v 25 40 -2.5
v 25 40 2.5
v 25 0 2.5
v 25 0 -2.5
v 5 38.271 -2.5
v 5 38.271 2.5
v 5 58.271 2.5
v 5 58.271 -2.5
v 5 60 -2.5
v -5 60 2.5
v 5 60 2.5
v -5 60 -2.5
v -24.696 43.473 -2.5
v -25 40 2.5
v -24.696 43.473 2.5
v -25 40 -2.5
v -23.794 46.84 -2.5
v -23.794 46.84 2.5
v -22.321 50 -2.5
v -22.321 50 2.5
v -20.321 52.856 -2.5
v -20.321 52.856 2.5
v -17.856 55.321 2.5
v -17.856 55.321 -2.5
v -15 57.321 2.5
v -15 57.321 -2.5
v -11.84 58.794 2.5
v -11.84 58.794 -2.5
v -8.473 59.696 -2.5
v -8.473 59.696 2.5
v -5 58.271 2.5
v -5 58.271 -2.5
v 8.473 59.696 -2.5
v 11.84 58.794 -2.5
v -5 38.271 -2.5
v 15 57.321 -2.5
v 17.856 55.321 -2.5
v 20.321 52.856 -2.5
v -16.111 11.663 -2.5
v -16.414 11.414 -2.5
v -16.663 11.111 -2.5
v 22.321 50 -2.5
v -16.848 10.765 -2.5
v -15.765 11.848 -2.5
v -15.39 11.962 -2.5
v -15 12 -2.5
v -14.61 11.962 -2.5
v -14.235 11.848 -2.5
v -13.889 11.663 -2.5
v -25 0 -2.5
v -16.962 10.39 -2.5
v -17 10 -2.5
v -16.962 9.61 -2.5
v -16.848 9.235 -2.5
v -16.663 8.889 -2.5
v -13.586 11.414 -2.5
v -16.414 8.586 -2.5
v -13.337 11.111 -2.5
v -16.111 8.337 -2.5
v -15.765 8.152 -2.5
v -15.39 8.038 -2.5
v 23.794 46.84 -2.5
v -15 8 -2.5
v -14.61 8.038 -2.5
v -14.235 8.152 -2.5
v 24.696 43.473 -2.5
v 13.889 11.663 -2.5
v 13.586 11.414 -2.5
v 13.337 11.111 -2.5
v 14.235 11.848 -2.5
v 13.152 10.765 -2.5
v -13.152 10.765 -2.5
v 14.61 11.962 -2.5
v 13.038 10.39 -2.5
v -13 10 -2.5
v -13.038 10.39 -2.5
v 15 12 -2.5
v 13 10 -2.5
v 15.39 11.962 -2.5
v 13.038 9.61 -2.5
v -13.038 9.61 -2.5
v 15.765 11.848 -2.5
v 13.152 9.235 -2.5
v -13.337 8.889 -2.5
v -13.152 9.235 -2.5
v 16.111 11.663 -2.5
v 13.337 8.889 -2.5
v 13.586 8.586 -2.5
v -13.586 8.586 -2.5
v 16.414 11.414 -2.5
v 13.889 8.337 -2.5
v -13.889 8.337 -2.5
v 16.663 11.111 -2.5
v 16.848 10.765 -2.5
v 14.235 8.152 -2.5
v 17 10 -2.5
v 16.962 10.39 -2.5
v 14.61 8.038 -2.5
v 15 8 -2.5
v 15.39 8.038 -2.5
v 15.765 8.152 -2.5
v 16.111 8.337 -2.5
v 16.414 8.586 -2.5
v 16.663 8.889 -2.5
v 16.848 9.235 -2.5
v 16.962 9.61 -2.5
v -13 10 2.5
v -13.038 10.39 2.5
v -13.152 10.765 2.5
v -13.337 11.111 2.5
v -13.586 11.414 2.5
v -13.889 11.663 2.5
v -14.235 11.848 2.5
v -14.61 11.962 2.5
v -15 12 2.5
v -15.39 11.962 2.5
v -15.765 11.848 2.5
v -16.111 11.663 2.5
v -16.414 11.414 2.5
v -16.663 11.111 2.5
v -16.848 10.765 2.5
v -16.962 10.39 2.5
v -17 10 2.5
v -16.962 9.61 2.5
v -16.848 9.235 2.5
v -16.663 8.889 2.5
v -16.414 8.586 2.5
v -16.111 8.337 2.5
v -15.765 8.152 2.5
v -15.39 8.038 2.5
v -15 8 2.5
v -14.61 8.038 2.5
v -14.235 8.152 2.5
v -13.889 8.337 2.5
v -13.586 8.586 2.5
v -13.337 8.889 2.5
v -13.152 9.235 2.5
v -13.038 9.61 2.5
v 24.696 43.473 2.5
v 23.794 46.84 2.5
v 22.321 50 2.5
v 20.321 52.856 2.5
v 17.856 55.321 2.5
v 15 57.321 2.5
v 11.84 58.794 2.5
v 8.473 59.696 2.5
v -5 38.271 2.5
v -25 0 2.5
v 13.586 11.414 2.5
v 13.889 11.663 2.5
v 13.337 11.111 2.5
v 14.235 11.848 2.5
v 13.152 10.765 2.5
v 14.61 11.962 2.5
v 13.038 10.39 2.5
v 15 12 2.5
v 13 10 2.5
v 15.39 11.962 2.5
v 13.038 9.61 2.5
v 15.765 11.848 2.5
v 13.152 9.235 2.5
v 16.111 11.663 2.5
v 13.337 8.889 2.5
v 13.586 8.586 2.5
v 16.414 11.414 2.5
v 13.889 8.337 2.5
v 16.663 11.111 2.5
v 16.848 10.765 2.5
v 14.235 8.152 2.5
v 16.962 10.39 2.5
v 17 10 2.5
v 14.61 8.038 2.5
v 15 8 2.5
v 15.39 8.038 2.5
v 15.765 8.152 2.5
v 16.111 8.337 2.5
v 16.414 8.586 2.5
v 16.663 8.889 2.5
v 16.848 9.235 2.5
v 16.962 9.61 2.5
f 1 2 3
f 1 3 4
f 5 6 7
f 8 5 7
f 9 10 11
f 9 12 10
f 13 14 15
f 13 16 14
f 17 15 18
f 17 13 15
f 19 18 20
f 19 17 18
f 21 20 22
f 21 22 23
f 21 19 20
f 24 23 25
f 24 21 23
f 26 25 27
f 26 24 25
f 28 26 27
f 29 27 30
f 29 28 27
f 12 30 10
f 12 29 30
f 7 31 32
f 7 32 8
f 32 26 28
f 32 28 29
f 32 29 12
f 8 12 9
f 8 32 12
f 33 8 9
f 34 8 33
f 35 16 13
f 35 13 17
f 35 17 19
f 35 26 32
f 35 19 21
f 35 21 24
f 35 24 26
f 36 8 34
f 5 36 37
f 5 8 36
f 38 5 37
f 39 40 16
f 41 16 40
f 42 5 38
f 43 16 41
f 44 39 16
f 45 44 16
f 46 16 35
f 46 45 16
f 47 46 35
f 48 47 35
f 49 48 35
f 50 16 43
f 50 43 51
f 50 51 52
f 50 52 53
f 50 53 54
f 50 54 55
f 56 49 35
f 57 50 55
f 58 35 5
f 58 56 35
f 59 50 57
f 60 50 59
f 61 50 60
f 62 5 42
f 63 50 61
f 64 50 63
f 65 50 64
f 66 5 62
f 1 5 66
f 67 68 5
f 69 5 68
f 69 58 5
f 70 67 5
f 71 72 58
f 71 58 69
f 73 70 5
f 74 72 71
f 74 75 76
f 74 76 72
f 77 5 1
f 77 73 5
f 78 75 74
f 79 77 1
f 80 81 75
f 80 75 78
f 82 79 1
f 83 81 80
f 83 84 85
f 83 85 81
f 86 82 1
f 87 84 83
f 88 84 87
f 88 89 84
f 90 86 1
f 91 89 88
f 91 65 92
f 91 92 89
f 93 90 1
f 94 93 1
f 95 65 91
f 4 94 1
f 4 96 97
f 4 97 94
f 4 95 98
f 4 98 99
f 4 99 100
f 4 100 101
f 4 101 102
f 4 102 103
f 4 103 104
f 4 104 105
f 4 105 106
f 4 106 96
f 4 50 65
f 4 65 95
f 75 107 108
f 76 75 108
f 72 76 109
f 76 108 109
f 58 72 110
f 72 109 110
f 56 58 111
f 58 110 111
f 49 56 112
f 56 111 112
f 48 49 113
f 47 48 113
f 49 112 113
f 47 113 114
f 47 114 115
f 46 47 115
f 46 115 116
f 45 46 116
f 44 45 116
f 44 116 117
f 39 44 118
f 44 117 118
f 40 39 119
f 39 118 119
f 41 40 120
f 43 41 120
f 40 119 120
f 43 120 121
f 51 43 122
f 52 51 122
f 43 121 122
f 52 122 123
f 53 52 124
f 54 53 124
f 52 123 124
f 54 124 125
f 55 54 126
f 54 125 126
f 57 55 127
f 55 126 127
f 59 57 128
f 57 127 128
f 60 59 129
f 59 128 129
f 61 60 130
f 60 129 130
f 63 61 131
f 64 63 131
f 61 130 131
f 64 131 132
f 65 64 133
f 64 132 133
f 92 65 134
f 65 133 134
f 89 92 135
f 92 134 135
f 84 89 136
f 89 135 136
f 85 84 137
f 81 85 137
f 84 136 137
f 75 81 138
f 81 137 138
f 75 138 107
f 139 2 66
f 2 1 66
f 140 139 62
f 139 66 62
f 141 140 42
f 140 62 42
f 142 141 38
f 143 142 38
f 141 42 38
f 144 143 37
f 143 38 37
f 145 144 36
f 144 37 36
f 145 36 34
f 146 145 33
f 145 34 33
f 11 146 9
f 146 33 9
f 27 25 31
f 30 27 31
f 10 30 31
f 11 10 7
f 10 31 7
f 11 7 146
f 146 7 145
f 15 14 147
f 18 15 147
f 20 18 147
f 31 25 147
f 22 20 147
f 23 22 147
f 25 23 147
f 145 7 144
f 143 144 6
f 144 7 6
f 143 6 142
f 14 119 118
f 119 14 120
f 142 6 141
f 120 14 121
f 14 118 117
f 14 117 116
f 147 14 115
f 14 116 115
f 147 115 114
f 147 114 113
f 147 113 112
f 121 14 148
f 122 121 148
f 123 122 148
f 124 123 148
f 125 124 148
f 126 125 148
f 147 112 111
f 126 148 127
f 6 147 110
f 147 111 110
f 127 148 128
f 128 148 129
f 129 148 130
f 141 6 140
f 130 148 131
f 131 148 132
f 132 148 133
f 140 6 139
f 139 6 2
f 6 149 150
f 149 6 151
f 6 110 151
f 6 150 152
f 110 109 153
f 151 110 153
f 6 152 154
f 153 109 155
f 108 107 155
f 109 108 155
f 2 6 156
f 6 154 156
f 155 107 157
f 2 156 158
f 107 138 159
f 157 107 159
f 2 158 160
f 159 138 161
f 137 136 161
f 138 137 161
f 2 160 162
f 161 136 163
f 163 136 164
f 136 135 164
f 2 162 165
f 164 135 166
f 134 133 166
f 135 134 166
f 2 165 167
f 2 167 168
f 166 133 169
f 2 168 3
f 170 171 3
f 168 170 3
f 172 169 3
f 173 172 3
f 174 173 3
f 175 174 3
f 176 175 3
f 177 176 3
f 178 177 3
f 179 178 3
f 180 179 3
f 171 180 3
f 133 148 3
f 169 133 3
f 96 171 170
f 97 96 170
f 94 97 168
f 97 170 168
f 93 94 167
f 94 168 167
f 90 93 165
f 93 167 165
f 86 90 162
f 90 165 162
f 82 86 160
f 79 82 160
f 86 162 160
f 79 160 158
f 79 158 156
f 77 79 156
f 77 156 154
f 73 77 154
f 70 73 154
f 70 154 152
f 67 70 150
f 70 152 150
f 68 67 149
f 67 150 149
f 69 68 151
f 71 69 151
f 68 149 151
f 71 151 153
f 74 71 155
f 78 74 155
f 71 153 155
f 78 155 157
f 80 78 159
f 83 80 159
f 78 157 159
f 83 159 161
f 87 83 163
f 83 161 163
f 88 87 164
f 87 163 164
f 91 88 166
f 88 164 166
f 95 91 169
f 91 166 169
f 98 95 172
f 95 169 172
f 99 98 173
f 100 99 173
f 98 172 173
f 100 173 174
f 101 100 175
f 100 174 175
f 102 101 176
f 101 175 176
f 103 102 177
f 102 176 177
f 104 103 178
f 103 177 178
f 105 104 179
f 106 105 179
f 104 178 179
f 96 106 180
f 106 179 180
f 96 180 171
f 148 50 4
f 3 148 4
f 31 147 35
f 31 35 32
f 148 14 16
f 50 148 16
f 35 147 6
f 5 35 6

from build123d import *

# Parameters (mm, degrees)
SKETCH1_W           = 50
SKETCH1_H           = 5
BOSS_EXTRUDE1_DEPTH = 60
FILLET1_R           = 20
SKETCH2_R           = 2
SKETCH2_W           = 10
SKETCH2_H           = 20
CUT_EXTRUDE1_DEPTH  = 5


with BuildPart() as part:
    # Sketch1 → Boss-Extrude1 (new body)
    with BuildSketch(Plane(origin=(0, 0, 0), x_dir=(1, 0, 0), z_dir=(0, 1, 0))):
        Rectangle(SKETCH1_W, SKETCH1_H)
    extrude(amount=BOSS_EXTRUDE1_DEPTH)

    # Fillet1
    fillet1_edges = [part.edges().sort_by_distance(p)[0] for p in [
        (25, 60, 0),
        (-25, 60, 0),
    ]]
    fillet(fillet1_edges, radius=FILLET1_R)

    # Sketch2 → Cut-Extrude1 (cut)
    with BuildSketch(Plane.XY.offset(2.5)):
        with Locations((-15, 10)):
            Circle(SKETCH2_R)
        with Locations((15, 10)):
            Circle(SKETCH2_R)
        with Locations((0, 48.271414018)):
            Rectangle(SKETCH2_W, SKETCH2_H)
    extrude(amount=-CUT_EXTRUDE1_DEPTH, mode=Mode.SUBTRACT)


solid = part.part
